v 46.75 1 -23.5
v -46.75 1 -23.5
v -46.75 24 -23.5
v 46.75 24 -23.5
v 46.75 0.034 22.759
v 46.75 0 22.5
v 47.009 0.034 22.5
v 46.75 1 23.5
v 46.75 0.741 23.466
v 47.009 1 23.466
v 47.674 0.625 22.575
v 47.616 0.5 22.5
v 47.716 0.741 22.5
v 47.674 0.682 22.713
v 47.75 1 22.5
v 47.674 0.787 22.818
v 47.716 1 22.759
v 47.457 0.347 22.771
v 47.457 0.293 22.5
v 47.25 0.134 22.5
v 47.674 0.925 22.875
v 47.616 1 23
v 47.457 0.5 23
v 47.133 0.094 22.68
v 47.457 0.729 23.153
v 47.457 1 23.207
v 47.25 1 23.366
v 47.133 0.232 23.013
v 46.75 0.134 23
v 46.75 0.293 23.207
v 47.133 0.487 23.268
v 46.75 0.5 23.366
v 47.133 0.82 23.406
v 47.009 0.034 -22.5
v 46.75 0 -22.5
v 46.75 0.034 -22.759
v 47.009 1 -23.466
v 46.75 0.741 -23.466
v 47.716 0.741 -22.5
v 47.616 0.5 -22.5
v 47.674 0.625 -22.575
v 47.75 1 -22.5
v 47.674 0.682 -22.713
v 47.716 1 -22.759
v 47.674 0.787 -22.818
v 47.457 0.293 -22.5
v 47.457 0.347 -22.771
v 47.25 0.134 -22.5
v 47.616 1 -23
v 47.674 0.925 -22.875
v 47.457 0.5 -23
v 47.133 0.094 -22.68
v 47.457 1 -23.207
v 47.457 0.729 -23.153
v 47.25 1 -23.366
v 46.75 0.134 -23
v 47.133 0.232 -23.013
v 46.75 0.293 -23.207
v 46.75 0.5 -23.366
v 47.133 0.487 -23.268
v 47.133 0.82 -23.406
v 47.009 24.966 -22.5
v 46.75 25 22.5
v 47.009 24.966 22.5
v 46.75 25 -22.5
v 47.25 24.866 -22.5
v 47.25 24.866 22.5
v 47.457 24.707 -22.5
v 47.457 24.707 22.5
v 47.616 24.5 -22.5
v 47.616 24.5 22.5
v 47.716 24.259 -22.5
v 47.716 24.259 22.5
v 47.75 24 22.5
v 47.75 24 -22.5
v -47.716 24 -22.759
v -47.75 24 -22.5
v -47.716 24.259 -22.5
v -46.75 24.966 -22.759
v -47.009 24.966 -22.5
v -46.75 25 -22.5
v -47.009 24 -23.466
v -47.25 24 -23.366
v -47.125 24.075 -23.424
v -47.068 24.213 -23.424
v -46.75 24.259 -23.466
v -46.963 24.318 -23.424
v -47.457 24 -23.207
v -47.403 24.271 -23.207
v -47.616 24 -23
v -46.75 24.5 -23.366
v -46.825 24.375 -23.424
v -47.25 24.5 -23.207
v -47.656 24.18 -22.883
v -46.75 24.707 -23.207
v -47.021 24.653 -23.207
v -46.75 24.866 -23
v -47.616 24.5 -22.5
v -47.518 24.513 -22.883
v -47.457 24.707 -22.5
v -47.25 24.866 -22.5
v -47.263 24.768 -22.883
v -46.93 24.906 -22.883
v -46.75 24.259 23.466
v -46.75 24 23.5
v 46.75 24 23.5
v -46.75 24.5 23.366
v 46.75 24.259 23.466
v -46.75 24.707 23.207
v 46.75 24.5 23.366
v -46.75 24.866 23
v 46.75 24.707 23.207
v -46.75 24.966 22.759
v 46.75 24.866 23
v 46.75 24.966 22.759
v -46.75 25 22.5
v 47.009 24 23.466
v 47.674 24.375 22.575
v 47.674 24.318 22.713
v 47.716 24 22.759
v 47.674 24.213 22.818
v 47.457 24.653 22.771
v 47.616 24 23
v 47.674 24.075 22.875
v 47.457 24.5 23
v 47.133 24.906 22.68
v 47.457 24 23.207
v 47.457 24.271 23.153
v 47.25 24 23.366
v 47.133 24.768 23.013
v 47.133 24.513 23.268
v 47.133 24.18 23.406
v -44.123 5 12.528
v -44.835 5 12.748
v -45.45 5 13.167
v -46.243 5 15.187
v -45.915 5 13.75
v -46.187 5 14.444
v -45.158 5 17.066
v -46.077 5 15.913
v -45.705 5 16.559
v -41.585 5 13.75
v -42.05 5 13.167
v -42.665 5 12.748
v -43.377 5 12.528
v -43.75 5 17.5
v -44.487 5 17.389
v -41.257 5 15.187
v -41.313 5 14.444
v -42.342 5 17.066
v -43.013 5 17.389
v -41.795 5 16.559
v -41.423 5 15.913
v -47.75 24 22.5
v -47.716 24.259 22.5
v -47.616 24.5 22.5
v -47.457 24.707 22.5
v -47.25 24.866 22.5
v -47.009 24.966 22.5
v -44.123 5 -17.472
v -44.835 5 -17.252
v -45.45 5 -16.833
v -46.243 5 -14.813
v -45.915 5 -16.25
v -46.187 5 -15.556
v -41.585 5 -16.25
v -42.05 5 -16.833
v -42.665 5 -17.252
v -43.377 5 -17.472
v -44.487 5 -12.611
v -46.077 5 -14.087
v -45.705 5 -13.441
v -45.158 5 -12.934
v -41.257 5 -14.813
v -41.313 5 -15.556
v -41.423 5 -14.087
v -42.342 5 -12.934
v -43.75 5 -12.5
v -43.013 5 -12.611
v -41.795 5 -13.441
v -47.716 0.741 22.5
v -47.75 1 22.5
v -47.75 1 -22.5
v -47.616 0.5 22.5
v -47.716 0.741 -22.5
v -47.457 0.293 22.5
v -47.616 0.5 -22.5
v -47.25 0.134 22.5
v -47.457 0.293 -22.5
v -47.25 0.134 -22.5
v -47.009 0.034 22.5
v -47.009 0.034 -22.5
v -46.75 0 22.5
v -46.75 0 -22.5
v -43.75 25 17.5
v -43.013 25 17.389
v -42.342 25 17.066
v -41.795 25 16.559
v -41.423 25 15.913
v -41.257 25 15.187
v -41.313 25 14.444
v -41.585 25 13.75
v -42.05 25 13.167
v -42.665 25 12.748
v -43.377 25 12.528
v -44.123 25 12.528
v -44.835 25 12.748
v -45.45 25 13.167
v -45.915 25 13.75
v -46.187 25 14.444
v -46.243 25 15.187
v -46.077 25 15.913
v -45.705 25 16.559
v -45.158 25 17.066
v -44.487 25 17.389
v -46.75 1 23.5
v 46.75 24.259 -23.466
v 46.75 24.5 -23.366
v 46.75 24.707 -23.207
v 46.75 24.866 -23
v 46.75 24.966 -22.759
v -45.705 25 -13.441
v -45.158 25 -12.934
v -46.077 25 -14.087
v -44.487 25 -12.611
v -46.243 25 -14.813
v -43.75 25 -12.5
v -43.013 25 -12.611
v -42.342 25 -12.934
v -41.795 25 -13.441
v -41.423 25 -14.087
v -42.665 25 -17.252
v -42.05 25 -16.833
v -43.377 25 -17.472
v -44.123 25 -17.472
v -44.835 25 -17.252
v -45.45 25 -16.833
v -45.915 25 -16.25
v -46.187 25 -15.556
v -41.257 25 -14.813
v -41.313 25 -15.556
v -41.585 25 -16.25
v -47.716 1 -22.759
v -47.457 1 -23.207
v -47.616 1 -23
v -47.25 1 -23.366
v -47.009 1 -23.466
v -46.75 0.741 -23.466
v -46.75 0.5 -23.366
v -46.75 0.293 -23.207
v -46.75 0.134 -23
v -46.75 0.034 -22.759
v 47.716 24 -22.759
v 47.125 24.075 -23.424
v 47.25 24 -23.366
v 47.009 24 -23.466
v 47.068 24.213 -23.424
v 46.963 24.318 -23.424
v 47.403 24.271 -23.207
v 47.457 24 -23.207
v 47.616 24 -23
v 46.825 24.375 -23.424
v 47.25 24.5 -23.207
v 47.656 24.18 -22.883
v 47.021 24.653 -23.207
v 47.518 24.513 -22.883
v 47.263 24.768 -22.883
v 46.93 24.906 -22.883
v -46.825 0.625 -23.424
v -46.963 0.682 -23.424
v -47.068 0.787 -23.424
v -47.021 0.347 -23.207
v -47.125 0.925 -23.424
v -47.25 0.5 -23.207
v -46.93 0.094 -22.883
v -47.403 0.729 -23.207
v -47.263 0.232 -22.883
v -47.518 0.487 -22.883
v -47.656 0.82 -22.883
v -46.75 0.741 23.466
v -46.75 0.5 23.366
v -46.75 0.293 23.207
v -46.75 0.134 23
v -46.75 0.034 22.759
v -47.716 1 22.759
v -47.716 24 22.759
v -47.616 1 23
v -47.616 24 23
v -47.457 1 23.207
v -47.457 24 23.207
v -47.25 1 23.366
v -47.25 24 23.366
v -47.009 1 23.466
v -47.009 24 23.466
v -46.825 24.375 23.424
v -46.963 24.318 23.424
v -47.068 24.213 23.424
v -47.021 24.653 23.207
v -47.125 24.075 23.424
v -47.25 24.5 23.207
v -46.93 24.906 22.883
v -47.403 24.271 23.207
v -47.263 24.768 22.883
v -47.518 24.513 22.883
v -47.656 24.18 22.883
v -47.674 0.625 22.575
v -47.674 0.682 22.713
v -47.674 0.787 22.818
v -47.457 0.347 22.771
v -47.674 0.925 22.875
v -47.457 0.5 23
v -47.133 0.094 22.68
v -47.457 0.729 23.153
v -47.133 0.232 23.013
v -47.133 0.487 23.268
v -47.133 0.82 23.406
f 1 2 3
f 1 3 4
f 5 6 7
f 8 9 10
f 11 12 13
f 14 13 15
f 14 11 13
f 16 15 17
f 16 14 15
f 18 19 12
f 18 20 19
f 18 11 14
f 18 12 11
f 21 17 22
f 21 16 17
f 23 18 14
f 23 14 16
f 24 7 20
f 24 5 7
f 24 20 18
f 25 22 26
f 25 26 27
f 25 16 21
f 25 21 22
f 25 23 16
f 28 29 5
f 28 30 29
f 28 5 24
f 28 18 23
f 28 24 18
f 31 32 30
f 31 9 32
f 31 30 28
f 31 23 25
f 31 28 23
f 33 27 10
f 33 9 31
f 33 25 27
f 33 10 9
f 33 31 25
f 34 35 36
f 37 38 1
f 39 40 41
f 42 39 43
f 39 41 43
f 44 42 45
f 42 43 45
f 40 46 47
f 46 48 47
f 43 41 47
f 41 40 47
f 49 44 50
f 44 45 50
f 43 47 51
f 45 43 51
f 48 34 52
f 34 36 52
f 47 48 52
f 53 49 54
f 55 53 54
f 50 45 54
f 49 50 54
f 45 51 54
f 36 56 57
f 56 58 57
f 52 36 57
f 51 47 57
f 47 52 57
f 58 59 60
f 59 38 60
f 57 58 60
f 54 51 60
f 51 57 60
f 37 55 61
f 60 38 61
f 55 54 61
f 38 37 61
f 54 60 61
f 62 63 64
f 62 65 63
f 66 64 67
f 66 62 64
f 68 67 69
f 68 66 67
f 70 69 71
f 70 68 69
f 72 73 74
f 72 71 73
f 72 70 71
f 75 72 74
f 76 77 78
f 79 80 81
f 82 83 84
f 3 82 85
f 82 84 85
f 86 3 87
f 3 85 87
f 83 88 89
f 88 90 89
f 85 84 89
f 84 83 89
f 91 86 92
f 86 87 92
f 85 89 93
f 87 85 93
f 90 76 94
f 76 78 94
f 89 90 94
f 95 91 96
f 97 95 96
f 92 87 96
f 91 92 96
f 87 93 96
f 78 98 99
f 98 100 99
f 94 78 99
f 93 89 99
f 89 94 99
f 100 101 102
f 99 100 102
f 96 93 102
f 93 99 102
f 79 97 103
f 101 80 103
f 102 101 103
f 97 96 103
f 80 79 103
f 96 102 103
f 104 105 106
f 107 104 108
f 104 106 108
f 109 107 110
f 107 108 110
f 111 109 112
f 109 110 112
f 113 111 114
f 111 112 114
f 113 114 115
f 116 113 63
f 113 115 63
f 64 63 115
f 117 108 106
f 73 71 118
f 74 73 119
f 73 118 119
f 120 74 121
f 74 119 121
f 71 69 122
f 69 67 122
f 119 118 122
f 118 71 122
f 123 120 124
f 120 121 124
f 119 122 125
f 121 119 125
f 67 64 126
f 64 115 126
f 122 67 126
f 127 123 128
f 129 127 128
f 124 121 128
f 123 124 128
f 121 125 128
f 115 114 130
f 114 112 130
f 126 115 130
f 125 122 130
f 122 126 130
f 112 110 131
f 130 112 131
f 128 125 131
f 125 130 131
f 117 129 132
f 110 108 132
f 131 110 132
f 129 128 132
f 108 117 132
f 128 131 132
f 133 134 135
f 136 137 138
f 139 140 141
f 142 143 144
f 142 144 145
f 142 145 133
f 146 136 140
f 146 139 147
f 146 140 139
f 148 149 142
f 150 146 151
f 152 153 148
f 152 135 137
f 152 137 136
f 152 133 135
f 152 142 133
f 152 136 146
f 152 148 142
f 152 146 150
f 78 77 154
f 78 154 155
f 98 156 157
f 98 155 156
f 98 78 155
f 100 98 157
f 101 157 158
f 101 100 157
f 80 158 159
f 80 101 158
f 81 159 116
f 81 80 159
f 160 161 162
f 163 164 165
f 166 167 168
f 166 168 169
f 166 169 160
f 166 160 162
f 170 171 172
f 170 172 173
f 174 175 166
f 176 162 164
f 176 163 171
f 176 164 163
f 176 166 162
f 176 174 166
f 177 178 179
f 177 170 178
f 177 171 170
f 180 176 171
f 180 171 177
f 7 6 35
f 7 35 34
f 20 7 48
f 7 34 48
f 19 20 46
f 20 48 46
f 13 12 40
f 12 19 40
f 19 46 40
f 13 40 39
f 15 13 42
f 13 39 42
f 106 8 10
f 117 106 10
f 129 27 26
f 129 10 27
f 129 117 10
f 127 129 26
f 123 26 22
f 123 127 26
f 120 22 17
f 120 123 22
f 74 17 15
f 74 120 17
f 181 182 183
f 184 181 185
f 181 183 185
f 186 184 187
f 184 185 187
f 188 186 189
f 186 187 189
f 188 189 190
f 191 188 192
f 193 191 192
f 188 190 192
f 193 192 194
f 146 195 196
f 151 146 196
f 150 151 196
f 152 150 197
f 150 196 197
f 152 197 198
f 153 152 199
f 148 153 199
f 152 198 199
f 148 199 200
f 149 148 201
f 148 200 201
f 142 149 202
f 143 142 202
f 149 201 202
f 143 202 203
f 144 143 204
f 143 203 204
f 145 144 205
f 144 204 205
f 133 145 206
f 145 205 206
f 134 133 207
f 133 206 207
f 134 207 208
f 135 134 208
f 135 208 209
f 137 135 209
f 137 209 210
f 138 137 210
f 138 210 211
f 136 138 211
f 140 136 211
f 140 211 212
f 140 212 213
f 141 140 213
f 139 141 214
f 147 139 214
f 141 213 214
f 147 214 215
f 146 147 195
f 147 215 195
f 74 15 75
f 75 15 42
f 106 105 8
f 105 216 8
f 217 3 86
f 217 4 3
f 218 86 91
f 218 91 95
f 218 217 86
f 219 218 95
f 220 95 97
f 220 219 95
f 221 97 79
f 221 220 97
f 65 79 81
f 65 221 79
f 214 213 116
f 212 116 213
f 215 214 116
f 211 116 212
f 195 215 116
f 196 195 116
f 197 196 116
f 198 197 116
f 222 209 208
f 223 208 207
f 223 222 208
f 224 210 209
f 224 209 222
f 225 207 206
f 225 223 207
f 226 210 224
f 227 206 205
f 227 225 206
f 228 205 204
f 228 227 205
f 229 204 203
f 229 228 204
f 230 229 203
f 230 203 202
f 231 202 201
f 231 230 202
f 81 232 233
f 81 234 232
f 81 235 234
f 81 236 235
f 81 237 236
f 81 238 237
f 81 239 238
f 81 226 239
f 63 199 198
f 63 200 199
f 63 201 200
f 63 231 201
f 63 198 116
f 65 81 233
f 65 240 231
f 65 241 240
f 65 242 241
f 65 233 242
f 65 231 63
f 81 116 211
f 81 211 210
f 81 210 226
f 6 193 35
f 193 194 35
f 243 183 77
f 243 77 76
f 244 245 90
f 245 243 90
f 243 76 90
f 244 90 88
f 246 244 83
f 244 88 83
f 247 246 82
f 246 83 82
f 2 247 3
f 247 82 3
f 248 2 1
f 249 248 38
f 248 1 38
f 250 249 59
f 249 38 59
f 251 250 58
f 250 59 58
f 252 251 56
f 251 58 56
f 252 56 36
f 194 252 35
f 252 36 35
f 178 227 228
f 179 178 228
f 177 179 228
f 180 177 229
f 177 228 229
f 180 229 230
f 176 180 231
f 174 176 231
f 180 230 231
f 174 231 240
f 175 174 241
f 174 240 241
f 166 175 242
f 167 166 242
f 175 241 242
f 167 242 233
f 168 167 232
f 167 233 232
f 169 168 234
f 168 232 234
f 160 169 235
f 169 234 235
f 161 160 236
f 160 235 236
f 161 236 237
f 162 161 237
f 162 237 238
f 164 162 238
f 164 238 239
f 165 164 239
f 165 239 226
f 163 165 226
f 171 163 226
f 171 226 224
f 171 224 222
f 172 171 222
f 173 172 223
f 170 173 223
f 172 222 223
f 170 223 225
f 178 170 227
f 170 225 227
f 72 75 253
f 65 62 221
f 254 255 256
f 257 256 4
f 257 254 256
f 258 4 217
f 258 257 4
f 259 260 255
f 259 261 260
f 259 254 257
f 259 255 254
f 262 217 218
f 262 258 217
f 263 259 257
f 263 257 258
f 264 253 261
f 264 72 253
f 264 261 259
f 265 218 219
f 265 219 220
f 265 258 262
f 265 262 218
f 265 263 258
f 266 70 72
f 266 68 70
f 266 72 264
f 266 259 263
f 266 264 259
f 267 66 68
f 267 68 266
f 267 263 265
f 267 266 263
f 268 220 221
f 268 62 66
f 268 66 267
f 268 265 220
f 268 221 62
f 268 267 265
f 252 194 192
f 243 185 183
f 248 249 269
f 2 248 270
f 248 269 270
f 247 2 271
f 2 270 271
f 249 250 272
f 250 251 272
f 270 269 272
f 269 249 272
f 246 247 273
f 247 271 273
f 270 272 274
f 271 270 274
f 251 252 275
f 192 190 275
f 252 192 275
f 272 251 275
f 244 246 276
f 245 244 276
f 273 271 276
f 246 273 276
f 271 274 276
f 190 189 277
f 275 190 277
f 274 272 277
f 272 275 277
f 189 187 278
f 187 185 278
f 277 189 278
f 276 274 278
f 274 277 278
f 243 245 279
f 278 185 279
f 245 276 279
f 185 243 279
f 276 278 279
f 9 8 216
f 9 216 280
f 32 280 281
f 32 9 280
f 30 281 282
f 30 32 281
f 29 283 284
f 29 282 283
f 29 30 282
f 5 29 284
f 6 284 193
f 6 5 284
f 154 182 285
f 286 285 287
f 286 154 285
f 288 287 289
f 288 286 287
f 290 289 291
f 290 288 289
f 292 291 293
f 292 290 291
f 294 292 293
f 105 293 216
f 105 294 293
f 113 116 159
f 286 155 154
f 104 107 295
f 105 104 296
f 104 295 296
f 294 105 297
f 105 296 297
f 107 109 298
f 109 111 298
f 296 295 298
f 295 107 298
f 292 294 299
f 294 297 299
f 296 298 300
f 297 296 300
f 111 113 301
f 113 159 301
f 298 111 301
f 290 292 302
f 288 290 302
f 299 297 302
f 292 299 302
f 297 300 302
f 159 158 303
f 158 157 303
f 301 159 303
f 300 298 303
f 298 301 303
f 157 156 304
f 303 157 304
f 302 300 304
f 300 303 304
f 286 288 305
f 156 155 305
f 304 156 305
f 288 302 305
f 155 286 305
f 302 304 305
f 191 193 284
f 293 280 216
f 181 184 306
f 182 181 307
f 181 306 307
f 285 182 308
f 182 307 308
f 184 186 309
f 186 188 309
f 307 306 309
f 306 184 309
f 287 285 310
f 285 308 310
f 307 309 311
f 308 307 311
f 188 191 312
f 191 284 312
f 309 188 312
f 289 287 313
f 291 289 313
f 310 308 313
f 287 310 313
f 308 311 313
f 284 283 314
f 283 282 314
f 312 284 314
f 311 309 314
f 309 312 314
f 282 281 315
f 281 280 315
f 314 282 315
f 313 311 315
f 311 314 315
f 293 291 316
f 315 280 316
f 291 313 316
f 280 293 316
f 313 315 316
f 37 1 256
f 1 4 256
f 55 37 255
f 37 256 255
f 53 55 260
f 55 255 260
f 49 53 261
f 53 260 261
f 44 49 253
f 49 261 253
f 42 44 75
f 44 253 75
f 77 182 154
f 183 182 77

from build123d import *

# Parameters (mm, degrees)
SKETCH1_W           = 95.5
SKETCH1_H           = 47
BOSS_EXTRUDE1_DEPTH = 25
SKETCH2_R           = 2.5
CUT_EXTRUDE1_DEPTH  = 20
FILLET1_R           = 1


with BuildPart() as part:
    # Sketch1 → Boss-Extrude1 (new body)
    with BuildSketch(Plane(origin=(0, 0, 0), x_dir=(1, 0, 0), z_dir=(0, 1, 0))):
        Rectangle(SKETCH1_W, SKETCH1_H)
    extrude(amount=BOSS_EXTRUDE1_DEPTH)

    # Sketch2 → Cut-Extrude1 (cut)
    with BuildSketch(Plane(origin=(0, 25, 0), x_dir=(1, 0, 0), z_dir=(0, 1, 0))):
        with Locations(Location((-43.75, 15, 0), (0, 0, 270))):
            Circle(SKETCH2_R)
        with Locations(Location((-43.75, -15, 0), (0, 0, 270))):
            Circle(SKETCH2_R)
    extrude(amount=-CUT_EXTRUDE1_DEPTH, mode=Mode.SUBTRACT)

    # Fillet1
    fillet1_edges = [part.edges().sort_by_distance(p)[0] for p in [
        (-47.75, 25, 0),
        (0, 25, 23.5),
        (47.75, 25, 0),
        (0, 0, 23.5),
        (-47.75, 0, 0),
        (0, 0, -23.5),
        (47.75, 0, 0),
        (47.75, 12.5, 23.5),
        (-47.75, 12.5, 23.5),
        (-47.75, 12.5, -23.5),
        (47.75, 12.5, -23.5),
        (0, 25, -23.5),
    ]]
    fillet(fillet1_edges, radius=FILLET1_R)


solid = part.part
